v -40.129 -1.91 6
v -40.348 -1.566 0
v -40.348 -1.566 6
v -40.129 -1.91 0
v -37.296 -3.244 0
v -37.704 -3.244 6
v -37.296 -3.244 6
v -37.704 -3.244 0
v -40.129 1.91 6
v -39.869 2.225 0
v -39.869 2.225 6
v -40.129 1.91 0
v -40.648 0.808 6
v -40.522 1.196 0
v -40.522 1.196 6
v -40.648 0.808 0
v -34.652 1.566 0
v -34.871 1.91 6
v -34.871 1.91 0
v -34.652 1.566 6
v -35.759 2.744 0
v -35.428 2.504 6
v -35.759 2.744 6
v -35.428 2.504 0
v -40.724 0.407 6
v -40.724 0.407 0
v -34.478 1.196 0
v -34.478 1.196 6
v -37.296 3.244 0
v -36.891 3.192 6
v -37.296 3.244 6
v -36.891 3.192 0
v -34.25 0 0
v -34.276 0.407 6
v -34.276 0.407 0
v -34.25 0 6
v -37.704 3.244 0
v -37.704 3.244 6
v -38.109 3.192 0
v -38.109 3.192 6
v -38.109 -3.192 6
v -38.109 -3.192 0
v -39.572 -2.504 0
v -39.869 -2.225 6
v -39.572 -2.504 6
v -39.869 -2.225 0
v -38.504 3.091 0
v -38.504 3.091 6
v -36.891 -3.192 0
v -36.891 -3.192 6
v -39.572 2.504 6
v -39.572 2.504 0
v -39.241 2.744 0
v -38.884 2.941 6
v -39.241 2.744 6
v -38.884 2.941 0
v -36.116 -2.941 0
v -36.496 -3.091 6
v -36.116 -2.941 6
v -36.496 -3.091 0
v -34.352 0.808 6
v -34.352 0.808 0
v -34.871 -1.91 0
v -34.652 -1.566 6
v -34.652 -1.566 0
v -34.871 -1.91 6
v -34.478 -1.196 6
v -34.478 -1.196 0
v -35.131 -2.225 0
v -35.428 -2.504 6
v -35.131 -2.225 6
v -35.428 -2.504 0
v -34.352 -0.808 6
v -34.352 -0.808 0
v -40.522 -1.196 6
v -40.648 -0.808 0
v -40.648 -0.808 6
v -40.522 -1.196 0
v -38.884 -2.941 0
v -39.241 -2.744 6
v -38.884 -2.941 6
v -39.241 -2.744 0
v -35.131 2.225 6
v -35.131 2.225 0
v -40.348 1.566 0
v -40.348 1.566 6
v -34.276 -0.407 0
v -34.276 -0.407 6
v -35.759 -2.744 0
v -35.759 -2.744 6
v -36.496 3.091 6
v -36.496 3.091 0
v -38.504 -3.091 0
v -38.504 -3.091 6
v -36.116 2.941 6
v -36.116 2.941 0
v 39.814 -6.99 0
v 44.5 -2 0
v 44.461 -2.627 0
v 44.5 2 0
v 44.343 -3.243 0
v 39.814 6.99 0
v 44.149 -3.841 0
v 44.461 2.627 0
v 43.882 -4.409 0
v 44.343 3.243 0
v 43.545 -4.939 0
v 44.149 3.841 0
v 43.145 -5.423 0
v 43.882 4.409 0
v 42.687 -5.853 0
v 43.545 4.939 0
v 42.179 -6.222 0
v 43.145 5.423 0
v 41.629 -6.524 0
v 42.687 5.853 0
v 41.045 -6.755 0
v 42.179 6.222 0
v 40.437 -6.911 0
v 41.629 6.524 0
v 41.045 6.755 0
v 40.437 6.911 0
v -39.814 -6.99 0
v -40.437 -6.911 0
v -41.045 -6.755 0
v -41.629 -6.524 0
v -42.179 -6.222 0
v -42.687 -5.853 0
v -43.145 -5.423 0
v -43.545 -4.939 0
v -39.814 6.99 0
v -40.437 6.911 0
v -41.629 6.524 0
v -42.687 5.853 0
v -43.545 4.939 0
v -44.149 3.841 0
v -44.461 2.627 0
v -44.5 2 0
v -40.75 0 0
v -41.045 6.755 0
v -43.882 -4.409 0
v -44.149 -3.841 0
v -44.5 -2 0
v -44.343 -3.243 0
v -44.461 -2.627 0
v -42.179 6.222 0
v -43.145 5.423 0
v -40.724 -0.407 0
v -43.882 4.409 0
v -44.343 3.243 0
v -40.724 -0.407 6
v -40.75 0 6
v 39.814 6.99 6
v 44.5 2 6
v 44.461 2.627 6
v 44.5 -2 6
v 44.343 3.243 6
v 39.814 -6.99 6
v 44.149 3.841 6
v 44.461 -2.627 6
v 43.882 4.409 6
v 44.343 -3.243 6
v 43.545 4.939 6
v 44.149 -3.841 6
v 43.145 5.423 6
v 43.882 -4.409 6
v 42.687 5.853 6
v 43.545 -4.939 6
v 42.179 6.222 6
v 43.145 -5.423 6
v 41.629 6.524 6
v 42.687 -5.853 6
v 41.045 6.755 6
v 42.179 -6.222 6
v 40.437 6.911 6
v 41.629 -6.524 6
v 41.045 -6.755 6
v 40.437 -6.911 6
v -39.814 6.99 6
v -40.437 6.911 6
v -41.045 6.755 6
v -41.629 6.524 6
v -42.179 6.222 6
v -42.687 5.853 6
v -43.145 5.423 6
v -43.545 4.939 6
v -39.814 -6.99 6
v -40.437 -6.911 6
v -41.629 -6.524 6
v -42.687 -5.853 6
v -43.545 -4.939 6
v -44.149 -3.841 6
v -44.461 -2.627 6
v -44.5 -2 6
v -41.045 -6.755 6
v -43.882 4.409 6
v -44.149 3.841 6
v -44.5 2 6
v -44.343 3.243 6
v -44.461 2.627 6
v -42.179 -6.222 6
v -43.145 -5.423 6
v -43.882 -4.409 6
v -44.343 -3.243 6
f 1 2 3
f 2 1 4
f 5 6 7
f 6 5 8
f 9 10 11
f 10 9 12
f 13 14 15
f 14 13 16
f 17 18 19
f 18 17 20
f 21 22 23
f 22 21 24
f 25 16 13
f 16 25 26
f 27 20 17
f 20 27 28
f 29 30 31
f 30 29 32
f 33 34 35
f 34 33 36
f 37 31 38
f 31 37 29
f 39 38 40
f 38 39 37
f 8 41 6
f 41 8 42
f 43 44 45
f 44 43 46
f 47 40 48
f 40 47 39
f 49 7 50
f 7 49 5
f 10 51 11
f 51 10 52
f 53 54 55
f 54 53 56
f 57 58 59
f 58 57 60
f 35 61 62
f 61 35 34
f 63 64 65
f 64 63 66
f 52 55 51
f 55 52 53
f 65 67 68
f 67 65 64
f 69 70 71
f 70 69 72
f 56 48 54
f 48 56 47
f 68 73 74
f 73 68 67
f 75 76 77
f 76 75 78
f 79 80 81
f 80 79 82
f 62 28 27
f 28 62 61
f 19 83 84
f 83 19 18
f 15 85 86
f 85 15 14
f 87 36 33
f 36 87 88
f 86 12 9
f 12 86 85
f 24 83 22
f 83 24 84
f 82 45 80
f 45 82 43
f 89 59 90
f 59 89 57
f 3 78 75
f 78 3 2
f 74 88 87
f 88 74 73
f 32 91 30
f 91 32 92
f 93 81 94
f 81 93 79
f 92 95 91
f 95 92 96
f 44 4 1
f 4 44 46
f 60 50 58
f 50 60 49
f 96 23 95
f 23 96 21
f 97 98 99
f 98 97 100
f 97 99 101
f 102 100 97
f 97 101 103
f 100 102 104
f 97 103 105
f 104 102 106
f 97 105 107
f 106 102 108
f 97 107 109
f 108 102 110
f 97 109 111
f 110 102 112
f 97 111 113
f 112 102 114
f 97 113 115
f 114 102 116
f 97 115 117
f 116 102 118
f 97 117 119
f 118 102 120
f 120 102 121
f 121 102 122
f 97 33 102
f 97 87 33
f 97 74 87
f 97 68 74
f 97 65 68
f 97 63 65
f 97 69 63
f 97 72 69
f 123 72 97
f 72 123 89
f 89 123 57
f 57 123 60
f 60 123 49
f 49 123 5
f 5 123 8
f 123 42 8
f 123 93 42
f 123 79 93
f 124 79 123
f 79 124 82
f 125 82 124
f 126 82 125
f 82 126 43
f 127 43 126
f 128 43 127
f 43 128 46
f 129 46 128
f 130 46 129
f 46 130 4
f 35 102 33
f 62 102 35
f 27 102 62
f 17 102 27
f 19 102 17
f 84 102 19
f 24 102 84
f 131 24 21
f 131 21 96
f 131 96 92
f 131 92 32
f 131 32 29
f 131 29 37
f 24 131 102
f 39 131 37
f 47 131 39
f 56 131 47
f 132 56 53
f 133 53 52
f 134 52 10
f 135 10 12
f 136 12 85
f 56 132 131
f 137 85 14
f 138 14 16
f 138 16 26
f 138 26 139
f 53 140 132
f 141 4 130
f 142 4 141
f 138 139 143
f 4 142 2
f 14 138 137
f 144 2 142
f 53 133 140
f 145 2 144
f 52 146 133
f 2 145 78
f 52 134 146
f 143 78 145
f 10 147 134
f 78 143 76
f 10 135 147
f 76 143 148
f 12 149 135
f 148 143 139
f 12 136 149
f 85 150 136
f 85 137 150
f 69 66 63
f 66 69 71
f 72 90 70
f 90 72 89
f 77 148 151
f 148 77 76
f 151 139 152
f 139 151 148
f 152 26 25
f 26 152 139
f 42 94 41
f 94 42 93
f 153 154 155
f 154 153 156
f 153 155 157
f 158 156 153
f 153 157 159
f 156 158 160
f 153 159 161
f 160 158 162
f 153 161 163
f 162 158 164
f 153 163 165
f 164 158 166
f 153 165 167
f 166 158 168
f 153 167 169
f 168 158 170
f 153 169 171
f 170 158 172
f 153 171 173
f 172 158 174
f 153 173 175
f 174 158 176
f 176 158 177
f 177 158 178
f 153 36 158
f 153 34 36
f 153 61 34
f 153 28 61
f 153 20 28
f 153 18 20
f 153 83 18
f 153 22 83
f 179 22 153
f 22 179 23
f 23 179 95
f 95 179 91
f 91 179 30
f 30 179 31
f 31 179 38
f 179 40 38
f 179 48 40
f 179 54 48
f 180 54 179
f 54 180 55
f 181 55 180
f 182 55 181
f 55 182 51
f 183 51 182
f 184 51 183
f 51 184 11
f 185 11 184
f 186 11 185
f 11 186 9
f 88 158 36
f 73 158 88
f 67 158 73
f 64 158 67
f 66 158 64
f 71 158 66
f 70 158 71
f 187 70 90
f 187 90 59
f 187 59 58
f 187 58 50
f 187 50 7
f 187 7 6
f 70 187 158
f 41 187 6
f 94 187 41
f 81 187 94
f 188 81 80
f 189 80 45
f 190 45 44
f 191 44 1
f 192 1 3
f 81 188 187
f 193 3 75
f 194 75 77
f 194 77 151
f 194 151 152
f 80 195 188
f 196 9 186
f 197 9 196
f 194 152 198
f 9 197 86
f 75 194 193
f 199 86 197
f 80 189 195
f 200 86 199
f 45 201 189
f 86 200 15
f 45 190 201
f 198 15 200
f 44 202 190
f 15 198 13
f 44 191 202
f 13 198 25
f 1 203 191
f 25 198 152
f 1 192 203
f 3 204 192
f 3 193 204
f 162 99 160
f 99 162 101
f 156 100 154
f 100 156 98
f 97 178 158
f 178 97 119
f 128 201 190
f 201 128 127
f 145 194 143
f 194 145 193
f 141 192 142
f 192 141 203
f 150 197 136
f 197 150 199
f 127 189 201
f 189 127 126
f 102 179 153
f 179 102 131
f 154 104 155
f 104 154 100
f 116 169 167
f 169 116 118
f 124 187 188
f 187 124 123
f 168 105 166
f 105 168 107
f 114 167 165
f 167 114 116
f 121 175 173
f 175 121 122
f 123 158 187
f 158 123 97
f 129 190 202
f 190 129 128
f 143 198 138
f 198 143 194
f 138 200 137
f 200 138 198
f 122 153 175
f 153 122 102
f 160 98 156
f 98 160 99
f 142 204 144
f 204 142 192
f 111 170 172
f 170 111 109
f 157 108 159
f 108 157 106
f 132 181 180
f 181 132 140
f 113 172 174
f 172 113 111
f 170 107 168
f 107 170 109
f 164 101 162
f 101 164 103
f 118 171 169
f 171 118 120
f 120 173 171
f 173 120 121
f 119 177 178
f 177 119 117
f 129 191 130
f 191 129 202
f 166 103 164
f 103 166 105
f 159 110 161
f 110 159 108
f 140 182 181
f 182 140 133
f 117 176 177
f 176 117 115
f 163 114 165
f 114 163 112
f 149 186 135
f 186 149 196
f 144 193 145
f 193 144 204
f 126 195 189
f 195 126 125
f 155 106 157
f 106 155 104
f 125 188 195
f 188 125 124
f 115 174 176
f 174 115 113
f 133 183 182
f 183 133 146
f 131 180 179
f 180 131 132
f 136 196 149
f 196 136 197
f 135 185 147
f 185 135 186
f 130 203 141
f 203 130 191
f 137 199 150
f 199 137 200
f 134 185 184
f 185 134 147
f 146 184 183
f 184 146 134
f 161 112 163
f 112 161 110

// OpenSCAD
$fn = 50;


difference() {
	union() {
		hull() {
			translate(v = [-39.5000000000, 2.0000000000, 0]) {
				cylinder(h = 6, r = 5);
			}
			translate(v = [39.5000000000, 2.0000000000, 0]) {
				cylinder(h = 6, r = 5);
			}
			translate(v = [-39.5000000000, -2.0000000000, 0]) {
				cylinder(h = 6, r = 5);
			}
			translate(v = [39.5000000000, -2.0000000000, 0]) {
				cylinder(h = 6, r = 5);
			}
		}
	}
	union() {
		translate(v = [-37.5000000000, 0.0000000000, 0]) {
			cylinder(h = 6, r = 3.2500000000);
		}
		translate(v = [-37.5000000000, 0.0000000000, 0]) {
			cylinder(h = 6, r = 1.8000000000);
		}
		translate(v = [-37.5000000000, 0.0000000000, 0]) {
			cylinder(h = 6, r = 1.8000000000);
		}
		translate(v = [-37.5000000000, 0.0000000000, 0]) {
			cylinder(h = 6, r = 1.8000000000);
		}
	}
}
